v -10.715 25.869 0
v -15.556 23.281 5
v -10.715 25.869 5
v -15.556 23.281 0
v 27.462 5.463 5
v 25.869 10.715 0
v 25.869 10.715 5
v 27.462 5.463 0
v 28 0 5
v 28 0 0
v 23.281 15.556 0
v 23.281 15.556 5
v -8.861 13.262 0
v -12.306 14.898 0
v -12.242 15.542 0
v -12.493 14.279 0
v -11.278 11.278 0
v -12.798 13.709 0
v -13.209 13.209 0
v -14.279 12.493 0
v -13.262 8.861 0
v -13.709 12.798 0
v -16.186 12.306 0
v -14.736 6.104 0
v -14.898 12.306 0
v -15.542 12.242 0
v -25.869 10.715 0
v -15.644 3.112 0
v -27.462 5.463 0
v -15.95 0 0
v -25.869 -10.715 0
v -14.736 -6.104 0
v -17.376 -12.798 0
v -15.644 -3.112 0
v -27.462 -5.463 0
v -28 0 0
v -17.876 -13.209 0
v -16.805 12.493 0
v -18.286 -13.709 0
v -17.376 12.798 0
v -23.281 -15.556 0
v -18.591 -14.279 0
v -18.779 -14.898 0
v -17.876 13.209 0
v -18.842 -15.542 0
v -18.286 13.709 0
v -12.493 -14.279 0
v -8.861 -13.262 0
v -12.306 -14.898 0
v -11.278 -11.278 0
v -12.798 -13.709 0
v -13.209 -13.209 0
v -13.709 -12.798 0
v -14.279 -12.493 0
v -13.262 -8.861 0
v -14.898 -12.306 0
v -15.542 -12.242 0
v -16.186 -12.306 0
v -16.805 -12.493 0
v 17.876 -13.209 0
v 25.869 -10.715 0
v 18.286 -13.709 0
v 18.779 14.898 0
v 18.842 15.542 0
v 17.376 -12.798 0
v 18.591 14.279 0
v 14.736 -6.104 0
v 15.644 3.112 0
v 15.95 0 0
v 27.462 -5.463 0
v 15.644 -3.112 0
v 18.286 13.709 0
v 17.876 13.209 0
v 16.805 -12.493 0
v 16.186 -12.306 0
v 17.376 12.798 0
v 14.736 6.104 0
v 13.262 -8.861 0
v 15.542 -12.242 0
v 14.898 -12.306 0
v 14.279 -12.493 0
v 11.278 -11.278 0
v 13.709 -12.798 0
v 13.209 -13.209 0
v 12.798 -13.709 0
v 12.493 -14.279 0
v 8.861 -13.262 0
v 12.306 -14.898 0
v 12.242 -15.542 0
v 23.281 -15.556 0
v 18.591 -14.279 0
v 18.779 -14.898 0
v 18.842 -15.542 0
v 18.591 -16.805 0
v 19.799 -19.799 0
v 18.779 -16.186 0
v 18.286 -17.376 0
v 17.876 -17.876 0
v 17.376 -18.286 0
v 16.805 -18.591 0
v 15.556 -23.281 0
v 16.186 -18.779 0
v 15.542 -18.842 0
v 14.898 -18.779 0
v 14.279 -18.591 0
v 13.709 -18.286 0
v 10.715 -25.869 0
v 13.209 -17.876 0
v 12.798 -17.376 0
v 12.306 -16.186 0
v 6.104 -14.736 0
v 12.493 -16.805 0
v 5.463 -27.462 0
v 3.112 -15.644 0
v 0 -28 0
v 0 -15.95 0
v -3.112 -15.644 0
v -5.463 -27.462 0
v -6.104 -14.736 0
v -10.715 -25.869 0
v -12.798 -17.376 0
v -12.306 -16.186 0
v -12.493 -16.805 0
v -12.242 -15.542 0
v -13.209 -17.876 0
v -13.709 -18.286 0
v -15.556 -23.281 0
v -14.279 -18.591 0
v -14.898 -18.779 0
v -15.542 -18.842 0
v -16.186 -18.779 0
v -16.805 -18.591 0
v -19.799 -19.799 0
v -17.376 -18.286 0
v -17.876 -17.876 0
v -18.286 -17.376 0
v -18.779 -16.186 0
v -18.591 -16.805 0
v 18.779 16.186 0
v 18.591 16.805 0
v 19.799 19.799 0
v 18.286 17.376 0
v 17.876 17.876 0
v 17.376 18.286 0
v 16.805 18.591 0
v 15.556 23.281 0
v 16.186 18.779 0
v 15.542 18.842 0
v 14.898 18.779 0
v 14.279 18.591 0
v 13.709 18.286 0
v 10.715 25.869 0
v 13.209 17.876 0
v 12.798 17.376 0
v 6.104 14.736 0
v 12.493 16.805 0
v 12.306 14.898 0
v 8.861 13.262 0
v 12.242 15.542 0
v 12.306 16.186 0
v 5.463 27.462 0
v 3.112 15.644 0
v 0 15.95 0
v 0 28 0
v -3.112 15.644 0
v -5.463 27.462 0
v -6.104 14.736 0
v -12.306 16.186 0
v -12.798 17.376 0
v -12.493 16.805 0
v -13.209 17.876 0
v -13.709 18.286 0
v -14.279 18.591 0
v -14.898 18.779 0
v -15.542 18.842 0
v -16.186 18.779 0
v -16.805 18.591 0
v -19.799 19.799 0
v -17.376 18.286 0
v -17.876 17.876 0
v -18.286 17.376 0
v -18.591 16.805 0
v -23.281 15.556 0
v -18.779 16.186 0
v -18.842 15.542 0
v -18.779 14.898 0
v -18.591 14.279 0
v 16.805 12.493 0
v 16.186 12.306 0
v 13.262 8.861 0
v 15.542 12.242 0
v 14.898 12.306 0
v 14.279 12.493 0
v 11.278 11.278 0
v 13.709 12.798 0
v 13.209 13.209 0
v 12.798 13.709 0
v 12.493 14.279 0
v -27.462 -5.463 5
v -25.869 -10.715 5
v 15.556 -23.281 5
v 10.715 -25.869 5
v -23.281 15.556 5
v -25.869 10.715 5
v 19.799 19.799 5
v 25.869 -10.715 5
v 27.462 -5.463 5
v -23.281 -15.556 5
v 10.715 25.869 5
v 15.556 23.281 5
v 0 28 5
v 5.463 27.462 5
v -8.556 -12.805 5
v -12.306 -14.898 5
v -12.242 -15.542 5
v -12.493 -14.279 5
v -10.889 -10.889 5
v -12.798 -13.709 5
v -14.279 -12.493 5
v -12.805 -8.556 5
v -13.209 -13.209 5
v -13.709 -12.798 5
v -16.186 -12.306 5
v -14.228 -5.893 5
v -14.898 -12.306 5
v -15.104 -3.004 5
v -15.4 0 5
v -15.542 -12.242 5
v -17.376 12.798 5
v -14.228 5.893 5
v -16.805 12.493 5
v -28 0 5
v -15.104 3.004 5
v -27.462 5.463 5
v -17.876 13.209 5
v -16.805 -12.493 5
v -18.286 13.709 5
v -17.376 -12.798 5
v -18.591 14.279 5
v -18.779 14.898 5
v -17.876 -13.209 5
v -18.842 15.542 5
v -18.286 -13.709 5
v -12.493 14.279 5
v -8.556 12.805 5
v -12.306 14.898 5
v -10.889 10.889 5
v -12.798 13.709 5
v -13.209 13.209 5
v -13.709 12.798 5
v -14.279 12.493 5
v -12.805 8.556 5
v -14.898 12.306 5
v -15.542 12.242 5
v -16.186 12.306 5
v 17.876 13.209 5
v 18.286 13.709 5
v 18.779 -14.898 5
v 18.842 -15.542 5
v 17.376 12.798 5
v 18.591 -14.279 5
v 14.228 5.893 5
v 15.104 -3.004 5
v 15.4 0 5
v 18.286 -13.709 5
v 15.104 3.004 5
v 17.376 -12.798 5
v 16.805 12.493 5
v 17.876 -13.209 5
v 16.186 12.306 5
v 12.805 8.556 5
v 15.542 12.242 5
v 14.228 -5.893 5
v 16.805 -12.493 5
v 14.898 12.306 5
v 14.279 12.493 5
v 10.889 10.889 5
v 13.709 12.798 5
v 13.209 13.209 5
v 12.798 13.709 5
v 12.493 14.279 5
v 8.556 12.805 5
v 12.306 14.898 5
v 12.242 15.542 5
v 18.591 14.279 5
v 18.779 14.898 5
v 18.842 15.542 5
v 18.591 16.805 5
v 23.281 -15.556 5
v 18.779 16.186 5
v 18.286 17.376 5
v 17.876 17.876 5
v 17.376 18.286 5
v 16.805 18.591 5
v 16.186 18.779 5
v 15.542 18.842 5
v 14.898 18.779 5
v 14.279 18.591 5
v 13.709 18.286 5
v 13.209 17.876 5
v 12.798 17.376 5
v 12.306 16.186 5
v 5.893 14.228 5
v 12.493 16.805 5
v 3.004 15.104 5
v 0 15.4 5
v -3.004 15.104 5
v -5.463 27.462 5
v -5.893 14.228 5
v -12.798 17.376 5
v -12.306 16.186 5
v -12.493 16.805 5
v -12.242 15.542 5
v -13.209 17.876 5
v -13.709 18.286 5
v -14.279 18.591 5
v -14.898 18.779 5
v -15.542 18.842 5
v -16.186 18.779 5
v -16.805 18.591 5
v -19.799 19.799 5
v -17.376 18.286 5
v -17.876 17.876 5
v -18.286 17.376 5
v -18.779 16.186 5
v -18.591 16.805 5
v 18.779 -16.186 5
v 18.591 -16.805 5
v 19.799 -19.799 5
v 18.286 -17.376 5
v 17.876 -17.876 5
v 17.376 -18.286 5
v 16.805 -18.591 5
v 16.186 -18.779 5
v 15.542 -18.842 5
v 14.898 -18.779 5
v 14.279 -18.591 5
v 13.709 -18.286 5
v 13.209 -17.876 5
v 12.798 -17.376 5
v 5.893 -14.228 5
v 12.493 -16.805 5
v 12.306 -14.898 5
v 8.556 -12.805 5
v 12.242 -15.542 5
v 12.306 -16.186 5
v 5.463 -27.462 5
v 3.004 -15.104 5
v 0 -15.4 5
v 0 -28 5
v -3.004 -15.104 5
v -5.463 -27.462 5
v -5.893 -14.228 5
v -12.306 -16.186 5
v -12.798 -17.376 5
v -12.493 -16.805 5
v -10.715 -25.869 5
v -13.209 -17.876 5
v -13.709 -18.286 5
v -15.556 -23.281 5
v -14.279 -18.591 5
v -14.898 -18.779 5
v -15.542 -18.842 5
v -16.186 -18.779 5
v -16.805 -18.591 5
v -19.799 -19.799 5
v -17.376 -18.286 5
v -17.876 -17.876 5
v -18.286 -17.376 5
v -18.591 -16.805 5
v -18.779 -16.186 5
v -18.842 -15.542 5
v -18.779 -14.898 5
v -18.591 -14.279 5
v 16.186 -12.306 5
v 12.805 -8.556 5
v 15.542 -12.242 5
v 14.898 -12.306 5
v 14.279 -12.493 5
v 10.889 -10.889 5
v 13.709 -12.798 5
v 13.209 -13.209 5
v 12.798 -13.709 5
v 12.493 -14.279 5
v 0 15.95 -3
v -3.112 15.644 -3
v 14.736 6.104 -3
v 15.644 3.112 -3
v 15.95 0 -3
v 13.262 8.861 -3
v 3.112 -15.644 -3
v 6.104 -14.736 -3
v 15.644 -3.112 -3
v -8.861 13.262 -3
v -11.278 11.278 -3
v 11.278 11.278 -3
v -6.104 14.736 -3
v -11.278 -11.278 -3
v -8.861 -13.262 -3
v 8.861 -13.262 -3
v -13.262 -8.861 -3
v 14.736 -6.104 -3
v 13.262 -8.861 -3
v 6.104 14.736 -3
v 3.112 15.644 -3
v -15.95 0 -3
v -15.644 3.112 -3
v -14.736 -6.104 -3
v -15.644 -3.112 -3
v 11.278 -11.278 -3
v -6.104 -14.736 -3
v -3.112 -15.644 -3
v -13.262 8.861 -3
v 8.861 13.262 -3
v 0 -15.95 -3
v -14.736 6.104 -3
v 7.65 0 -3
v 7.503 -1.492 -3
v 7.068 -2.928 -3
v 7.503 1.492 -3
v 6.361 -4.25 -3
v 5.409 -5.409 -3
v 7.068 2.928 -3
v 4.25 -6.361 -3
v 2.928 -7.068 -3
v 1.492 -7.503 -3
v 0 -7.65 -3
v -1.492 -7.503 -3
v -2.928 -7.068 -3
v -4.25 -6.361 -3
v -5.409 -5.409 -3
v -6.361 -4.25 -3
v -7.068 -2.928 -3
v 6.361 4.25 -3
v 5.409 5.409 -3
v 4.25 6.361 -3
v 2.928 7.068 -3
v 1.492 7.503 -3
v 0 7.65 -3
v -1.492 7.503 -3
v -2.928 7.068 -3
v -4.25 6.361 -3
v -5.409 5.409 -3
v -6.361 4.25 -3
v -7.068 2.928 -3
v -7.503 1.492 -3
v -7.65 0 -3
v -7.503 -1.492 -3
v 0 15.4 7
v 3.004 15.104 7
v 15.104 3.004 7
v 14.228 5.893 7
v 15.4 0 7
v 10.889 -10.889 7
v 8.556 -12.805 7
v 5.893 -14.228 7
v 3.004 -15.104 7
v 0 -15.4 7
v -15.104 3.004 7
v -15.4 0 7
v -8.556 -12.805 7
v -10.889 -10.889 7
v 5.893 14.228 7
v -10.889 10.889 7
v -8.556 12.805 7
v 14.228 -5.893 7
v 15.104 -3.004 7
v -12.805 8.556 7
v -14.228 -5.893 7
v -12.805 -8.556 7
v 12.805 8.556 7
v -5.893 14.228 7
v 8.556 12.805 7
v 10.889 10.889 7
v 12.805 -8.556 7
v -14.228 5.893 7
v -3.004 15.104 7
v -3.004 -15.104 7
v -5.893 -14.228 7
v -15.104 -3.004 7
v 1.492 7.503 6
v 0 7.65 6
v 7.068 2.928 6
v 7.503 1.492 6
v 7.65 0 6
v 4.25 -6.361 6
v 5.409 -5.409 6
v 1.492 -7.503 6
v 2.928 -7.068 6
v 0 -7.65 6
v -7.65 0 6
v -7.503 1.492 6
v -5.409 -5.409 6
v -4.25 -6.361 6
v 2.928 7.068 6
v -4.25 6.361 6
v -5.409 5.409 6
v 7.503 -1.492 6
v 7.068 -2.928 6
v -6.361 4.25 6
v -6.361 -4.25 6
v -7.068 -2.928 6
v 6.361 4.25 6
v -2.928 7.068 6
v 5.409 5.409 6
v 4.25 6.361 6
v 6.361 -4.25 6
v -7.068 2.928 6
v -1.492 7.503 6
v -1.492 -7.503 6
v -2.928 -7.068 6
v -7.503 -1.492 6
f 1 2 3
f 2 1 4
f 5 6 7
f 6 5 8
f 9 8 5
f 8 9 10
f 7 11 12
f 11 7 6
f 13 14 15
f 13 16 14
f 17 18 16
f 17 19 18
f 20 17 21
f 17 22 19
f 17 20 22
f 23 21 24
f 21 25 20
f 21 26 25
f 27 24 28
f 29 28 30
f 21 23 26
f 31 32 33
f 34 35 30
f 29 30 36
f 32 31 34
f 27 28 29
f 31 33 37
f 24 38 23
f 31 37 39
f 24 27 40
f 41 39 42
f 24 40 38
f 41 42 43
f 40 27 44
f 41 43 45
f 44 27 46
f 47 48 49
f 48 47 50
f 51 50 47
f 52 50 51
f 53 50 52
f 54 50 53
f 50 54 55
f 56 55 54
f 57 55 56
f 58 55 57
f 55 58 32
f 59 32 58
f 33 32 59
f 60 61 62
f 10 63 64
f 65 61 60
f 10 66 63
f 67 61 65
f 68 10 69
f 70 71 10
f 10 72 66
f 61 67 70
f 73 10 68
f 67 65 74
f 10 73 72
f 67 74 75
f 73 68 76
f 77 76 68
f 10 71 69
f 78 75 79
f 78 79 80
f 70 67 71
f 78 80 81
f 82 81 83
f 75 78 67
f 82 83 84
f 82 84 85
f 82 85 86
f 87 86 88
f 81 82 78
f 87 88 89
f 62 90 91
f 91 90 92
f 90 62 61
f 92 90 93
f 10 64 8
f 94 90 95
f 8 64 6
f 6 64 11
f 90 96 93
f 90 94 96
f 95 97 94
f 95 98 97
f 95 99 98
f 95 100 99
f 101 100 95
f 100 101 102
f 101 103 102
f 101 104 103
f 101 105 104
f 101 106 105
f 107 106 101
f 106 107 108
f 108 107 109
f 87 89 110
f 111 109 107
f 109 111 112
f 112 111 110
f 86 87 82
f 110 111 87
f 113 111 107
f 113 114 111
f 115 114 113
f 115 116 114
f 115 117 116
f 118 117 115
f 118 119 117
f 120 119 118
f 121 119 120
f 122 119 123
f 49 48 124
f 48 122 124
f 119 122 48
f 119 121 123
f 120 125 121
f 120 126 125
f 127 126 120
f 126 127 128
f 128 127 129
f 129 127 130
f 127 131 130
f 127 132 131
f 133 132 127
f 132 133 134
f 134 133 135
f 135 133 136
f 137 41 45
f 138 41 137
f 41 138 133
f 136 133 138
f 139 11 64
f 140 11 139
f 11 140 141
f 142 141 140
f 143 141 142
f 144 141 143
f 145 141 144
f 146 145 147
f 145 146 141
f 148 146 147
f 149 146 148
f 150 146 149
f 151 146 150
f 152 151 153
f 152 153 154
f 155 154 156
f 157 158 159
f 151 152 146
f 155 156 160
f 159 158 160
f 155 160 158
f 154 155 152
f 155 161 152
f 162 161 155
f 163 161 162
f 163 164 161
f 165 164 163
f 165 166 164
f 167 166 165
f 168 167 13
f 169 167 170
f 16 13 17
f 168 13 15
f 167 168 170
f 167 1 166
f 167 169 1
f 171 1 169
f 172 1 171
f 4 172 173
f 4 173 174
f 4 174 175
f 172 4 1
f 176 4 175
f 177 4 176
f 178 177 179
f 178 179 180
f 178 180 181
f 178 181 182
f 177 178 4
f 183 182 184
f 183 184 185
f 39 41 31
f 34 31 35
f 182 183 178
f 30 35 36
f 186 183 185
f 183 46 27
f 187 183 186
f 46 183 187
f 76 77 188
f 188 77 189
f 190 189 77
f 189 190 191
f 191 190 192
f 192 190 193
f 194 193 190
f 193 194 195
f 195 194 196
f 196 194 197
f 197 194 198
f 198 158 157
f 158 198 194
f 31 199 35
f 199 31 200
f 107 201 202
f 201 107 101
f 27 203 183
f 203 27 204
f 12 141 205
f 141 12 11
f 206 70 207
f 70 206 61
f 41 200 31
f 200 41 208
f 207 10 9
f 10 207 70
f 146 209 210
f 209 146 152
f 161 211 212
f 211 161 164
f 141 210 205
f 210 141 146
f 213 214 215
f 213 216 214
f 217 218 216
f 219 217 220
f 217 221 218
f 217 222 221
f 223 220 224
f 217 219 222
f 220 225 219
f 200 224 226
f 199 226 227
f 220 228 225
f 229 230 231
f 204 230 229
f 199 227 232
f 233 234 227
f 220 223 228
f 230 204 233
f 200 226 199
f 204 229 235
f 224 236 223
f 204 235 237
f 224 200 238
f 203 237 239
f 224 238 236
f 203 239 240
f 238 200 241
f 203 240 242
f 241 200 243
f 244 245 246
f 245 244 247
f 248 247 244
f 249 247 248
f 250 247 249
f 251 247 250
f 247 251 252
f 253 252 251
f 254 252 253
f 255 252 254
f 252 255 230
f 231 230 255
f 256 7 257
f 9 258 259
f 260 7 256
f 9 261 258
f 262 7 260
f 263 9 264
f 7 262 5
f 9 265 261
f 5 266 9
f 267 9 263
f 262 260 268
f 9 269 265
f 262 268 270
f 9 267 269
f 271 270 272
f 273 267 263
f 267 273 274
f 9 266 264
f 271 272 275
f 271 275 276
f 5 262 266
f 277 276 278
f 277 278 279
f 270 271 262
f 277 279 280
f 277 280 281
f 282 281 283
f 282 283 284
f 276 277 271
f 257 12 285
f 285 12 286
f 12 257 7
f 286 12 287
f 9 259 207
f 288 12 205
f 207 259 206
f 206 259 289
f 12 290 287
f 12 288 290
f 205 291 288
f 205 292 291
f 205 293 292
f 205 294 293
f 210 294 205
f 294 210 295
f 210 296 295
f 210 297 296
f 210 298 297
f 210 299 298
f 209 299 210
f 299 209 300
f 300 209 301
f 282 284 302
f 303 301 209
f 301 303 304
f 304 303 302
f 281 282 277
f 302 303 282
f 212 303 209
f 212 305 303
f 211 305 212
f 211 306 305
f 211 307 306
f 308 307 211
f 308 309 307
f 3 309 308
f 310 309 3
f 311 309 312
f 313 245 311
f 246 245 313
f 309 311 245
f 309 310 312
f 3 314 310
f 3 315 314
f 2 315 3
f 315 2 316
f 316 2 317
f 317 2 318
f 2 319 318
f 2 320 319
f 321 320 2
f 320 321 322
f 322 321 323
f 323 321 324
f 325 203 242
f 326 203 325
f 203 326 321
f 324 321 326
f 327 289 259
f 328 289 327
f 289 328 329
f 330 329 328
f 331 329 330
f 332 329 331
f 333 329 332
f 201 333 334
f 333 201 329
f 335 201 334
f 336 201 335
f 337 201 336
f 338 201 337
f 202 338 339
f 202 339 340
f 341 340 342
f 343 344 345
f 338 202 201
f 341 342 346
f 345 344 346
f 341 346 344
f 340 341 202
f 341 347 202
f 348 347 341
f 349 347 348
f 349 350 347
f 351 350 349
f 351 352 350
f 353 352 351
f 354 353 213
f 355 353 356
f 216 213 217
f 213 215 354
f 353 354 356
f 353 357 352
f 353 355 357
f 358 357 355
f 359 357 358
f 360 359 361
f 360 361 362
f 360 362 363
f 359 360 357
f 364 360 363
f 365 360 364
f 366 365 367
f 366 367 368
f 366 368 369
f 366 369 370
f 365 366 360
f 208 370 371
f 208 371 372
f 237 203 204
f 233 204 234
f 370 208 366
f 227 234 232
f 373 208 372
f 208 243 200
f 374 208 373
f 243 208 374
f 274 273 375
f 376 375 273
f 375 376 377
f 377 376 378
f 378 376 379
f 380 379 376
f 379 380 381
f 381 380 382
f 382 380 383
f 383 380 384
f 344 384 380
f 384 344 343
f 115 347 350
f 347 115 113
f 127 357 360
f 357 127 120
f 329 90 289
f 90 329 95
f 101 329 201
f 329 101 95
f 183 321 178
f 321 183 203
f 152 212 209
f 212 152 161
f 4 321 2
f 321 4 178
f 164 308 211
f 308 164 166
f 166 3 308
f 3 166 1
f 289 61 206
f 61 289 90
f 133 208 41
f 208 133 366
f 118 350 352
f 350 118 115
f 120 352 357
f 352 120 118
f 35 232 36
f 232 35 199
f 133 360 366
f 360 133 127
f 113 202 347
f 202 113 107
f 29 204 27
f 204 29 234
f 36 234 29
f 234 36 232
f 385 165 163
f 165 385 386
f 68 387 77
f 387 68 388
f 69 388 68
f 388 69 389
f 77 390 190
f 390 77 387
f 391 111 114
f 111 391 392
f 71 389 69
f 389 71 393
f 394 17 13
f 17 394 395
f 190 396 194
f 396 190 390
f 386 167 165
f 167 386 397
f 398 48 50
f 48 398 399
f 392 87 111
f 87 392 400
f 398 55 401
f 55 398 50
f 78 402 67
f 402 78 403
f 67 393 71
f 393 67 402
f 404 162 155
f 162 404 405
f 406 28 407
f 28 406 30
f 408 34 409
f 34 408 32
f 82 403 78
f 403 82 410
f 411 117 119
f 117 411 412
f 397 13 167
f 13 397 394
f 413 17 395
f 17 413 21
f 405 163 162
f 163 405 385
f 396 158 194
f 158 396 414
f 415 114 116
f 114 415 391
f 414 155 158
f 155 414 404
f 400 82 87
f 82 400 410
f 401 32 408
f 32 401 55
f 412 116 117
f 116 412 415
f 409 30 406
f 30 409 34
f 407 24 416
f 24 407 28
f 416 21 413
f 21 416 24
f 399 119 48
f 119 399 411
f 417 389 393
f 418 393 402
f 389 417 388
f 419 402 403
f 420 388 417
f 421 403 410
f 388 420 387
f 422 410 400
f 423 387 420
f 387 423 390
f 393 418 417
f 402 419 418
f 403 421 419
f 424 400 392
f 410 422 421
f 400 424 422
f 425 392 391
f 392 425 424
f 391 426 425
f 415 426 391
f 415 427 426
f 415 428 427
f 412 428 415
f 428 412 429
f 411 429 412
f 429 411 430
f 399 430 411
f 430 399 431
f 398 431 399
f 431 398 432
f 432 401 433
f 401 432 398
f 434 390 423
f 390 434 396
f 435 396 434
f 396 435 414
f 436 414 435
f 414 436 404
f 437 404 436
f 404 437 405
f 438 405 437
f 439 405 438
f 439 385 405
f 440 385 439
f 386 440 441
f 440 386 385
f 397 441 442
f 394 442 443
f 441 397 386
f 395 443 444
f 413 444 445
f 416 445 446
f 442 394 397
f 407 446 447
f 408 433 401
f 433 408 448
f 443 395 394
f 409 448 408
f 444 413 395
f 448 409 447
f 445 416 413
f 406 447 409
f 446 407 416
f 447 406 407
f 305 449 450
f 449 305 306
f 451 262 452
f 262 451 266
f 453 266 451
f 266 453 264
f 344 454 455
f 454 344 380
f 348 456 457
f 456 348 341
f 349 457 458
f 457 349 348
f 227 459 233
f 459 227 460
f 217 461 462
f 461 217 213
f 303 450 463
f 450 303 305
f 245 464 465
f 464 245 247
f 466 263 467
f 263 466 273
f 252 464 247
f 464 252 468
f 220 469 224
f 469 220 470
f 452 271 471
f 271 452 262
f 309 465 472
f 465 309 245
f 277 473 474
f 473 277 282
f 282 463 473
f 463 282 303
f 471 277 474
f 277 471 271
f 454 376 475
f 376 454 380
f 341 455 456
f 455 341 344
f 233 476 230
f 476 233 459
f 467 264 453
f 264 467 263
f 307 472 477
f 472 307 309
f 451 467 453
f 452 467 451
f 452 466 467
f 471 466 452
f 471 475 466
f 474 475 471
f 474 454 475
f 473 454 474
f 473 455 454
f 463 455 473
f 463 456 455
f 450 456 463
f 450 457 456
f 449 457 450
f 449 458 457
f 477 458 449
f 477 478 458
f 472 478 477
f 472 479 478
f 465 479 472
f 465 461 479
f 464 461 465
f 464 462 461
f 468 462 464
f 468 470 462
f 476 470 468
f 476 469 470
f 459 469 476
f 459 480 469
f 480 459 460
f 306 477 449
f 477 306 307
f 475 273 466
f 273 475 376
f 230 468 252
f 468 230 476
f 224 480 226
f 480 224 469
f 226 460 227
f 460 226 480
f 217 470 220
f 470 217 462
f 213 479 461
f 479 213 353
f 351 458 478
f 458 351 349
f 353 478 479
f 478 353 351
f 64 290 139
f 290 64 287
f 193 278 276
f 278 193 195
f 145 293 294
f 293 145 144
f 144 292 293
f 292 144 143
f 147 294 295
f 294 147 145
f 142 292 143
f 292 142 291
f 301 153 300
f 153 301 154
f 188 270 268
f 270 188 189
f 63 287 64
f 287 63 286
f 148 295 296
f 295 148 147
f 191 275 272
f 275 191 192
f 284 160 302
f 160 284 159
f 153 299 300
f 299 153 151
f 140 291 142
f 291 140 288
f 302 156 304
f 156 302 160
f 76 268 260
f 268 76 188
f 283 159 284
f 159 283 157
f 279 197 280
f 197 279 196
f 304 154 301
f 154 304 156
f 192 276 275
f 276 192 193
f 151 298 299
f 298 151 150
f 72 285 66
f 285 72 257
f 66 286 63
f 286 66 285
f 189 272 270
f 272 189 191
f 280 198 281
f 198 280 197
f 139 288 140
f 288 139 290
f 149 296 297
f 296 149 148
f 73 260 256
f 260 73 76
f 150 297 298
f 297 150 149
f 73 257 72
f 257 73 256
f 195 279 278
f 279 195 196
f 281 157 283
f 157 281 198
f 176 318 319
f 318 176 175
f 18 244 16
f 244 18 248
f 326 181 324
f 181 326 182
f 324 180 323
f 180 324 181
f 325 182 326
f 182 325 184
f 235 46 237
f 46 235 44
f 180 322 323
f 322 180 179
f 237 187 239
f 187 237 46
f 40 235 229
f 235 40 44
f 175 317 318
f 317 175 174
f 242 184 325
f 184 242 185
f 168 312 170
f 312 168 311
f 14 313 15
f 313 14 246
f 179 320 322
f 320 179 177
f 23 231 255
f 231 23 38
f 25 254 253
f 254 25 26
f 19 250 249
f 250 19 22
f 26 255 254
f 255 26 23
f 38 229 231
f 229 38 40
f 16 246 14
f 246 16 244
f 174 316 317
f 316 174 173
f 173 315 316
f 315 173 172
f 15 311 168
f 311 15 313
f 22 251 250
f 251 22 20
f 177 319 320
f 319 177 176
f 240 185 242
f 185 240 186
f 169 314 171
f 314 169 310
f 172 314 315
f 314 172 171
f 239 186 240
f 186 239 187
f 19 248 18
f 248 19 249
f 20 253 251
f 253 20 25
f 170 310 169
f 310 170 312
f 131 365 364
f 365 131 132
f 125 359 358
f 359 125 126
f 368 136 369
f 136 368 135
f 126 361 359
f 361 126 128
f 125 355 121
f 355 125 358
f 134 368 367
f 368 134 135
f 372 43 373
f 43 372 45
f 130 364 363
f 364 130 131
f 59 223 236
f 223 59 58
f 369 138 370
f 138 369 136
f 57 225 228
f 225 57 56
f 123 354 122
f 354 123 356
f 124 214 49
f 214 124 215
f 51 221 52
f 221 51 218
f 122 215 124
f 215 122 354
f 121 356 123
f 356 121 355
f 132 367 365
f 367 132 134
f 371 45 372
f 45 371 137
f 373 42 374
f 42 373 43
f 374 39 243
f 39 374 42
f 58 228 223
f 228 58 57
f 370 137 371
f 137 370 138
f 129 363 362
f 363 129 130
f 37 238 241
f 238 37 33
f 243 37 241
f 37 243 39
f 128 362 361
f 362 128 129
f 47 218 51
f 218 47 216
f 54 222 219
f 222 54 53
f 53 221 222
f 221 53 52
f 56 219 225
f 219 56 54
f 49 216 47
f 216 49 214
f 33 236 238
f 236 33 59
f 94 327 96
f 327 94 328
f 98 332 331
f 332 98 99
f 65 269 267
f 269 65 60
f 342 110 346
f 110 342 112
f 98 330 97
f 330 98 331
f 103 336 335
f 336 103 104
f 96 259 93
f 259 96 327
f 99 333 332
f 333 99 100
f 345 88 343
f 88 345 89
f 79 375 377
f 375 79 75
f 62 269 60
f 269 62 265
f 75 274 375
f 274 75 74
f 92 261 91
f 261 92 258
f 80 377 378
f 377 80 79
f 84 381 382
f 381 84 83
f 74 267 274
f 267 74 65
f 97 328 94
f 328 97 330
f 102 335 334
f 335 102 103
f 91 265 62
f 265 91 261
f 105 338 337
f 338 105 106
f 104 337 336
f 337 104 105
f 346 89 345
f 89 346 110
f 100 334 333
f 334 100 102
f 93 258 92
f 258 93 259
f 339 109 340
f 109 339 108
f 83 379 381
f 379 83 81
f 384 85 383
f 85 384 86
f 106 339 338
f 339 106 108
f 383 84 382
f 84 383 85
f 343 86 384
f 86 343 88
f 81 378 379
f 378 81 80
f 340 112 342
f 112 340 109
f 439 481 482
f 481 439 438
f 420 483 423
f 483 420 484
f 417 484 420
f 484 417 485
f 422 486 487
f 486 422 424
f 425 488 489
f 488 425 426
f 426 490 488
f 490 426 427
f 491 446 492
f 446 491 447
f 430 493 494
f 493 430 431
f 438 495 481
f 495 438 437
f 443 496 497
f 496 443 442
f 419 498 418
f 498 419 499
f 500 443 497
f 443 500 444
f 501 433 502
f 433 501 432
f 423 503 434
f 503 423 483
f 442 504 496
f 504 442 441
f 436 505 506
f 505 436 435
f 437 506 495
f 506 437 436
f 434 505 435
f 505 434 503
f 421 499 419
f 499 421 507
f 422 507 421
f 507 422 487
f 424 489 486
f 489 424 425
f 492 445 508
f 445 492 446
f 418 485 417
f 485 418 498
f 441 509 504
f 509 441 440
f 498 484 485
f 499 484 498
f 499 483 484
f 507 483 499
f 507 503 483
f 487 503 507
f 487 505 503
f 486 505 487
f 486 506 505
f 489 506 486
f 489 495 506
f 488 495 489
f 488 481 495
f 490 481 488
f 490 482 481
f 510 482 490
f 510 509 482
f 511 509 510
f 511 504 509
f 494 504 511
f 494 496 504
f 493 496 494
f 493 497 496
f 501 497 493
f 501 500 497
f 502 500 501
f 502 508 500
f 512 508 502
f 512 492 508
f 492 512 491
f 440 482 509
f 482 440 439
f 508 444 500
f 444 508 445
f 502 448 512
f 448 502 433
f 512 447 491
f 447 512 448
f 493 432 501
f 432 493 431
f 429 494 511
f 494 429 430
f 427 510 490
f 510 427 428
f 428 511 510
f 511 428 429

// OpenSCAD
$fn = 32;

// ----------------------------------------------------------------------
// Retaining cap: 6002 cover, 56 mm, spigot 31.9 mm
// ----------------------------------------------------------------------

// --- parameters (mm) ---
plate_d = 56;             // cover diameter
plate_t = 5;              // cover thickness
boss_d = 31.9;            // spigot that enters the housing
boss_h = 3;               // spigot height
shaft_d = 15.3;           // shaft opening
bolt_d = 6.6;             // bolt clearance
bolt_r = 21.98;           // bolt circle radius
dome_h = 2;               // raised centre

module cover() {
  cylinder(h = plate_t, d = plate_d);
}

module spigot() {
  /* sunk 1 mm into the cover; the spigot sets the overall height */
  translate([0, 0, -boss_h]) cylinder(h = boss_h + 1, d = boss_d);
}

module dome() {
  translate([0, 0, plate_t - 1]) cylinder(h = dome_h + 1, d = plate_d * 0.55);
}

difference() {
  union() {
    cover();
    spigot();
    dome();
  }
  for (i = [0 : 3]) rotate([0, 0, 45 + i * 90]) translate([bolt_r, 0, -boss_h - 1])
    cylinder(h = boss_h + plate_t + 2, d = bolt_d);
  translate([0, 0, -boss_h - 1]) cylinder(h = boss_h + plate_t + 2, d = shaft_d);
}
